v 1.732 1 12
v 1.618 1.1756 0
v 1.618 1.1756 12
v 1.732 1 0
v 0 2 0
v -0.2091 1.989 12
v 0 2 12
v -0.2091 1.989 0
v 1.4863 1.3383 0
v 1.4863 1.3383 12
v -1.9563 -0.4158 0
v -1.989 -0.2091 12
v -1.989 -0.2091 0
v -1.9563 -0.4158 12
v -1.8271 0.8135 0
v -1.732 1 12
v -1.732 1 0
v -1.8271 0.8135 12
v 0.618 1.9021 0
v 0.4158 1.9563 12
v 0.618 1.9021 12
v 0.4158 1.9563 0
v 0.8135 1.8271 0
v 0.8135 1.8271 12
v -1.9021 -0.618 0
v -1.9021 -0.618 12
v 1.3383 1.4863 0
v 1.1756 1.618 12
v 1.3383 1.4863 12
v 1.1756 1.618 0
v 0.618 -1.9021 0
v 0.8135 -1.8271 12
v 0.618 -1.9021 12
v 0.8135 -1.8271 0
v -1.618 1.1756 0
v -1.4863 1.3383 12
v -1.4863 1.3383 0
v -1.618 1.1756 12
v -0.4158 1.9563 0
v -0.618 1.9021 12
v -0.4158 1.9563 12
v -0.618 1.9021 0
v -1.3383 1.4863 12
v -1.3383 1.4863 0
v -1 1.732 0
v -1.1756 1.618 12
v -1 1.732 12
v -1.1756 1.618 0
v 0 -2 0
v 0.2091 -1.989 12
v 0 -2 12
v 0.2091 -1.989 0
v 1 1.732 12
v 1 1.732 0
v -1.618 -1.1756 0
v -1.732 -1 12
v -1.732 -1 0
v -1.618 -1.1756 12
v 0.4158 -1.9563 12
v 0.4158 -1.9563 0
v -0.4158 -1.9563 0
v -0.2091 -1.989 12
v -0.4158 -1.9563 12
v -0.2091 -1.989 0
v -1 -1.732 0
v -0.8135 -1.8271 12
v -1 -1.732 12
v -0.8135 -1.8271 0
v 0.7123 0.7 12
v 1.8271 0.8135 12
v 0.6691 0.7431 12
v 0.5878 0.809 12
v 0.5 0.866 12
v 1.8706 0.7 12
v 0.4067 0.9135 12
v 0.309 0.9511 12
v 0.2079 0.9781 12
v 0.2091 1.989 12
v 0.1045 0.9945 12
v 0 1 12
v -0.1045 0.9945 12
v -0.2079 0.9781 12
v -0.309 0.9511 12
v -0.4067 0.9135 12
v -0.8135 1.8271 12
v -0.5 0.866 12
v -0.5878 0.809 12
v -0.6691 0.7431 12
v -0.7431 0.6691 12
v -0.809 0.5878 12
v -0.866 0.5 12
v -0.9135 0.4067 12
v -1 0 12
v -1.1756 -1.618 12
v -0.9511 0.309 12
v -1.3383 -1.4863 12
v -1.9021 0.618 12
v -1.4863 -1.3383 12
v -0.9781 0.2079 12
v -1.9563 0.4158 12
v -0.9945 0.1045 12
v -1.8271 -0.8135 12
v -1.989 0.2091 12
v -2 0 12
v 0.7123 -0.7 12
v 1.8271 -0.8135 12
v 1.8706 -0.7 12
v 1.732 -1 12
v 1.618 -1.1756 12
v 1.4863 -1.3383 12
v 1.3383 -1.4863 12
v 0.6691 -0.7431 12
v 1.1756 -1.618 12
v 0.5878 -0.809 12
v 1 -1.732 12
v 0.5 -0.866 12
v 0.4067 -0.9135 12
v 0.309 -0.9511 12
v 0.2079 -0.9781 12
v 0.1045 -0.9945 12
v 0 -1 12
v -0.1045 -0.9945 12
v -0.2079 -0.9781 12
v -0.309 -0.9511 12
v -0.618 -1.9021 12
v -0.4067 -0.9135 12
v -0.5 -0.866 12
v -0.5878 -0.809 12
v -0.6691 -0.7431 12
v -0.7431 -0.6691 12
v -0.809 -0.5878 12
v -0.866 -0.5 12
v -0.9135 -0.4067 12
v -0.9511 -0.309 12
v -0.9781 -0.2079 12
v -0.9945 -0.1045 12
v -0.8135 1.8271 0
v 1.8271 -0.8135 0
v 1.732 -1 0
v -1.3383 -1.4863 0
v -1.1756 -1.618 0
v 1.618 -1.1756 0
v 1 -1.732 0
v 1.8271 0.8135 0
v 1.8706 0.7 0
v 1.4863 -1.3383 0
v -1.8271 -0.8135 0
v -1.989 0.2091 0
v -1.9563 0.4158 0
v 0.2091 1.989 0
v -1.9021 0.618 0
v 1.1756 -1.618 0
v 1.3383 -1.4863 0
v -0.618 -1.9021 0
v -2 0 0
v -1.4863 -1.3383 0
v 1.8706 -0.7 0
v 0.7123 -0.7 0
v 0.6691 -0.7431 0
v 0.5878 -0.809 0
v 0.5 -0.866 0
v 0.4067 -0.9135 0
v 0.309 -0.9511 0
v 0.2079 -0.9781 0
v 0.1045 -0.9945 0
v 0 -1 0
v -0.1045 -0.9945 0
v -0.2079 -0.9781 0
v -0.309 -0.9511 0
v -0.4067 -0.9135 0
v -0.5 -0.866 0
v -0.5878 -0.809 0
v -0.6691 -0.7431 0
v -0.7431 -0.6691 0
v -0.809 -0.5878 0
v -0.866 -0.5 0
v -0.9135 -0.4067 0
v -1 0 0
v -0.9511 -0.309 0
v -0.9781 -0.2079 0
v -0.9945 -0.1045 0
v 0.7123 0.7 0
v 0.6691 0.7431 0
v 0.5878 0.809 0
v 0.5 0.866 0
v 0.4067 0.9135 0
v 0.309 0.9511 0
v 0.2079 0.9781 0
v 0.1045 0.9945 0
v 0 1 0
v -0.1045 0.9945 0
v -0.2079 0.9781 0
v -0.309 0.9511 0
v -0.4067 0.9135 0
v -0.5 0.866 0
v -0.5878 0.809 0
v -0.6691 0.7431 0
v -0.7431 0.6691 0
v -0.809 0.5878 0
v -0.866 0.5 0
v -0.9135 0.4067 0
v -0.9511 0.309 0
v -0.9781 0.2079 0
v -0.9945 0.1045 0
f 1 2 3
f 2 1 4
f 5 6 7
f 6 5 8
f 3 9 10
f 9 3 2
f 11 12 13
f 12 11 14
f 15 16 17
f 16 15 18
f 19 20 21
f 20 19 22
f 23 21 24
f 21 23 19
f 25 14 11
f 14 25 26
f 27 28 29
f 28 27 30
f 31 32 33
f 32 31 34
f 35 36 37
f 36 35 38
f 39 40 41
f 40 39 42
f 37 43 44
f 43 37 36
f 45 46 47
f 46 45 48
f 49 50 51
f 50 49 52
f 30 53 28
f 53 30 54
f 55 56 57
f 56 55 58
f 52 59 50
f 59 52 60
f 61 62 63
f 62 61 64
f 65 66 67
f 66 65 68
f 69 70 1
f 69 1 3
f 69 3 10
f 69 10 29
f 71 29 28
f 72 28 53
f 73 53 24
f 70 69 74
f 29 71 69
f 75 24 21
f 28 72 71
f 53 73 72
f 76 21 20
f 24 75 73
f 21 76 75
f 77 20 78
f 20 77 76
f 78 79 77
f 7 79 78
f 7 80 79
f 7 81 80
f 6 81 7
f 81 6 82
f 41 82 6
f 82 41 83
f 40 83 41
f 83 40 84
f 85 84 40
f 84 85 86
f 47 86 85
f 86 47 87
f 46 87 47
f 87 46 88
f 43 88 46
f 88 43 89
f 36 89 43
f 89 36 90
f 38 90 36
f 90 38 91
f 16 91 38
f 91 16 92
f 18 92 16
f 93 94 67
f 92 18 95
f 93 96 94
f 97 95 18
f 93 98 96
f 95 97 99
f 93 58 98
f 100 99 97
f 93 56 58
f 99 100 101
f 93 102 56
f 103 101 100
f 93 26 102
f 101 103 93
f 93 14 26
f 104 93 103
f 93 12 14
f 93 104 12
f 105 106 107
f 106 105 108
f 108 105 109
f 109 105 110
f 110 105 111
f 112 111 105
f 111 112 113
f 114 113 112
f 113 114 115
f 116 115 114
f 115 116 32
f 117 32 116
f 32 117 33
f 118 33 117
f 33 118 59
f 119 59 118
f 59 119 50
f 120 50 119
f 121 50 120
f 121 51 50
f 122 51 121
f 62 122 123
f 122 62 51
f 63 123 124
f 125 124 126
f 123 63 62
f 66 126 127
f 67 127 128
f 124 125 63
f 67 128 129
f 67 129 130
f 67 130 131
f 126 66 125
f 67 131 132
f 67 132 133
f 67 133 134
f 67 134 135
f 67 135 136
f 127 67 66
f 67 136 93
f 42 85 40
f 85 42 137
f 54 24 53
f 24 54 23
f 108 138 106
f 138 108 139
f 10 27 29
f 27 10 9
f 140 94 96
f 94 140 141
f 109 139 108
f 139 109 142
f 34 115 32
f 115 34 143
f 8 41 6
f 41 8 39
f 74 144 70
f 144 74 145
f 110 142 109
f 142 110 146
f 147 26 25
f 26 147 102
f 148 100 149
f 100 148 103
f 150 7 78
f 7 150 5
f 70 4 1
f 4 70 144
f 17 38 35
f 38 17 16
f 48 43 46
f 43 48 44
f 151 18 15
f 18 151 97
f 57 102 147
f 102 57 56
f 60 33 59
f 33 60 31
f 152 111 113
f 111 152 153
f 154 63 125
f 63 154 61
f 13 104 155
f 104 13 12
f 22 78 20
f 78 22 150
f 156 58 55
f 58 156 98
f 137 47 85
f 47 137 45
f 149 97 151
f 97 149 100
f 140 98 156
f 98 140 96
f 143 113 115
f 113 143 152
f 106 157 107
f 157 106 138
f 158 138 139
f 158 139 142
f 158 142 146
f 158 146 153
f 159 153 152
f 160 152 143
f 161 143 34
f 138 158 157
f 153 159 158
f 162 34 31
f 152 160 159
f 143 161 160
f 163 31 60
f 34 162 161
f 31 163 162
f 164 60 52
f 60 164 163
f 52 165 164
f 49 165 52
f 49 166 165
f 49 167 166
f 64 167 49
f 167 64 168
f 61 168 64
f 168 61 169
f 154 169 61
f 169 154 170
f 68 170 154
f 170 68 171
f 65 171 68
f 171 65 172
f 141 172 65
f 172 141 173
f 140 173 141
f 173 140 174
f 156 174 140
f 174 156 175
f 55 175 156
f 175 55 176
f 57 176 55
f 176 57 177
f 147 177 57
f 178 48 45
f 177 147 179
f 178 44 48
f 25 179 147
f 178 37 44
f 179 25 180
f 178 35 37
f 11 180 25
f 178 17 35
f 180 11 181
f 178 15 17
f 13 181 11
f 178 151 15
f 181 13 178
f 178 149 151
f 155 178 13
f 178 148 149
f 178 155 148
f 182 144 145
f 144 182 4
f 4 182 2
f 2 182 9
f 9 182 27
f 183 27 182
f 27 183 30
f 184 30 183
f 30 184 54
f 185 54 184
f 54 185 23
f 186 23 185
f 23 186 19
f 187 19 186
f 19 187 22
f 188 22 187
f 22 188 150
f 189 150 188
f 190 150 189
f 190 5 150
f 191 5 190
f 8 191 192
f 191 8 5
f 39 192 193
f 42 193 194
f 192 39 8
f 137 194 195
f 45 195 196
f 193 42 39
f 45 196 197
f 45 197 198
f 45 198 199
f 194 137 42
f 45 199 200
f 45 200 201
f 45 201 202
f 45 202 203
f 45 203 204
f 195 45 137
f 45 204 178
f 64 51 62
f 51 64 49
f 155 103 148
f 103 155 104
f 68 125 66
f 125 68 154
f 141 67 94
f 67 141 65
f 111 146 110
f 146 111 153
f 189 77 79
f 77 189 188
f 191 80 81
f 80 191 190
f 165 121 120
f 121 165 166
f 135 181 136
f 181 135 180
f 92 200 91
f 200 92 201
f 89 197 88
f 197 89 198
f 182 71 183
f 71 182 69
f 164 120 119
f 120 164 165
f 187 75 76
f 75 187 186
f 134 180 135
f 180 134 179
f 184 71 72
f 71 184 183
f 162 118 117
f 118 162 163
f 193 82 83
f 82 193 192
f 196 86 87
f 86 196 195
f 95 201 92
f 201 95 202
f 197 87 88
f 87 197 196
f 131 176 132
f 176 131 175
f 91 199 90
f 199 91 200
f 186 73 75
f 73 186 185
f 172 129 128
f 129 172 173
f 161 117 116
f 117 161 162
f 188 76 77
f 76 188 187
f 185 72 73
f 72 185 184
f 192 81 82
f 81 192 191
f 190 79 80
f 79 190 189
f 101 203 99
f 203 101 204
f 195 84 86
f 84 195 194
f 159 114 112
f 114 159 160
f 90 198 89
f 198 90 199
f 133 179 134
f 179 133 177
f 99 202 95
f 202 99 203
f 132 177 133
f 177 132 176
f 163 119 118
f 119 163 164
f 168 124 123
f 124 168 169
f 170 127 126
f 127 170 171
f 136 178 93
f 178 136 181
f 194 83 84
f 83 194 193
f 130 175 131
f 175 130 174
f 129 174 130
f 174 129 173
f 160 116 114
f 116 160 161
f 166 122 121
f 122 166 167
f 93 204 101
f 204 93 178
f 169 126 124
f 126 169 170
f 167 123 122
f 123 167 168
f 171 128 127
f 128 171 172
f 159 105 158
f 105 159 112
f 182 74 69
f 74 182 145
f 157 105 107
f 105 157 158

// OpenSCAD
// Slotted roll pin.
$fn = 60;
eps = 0.02;
inner_d = 2;
outer_d = 4;
length = 12;
slot = 1.4;
difference() {
    cylinder(d=outer_d,h=length);
    translate([0,0,-eps]) cylinder(d=inner_d,h=length+2*eps);
    translate([0,-slot/2,-eps]) cube([outer_d/2+eps,slot,length+2*eps]);
}
